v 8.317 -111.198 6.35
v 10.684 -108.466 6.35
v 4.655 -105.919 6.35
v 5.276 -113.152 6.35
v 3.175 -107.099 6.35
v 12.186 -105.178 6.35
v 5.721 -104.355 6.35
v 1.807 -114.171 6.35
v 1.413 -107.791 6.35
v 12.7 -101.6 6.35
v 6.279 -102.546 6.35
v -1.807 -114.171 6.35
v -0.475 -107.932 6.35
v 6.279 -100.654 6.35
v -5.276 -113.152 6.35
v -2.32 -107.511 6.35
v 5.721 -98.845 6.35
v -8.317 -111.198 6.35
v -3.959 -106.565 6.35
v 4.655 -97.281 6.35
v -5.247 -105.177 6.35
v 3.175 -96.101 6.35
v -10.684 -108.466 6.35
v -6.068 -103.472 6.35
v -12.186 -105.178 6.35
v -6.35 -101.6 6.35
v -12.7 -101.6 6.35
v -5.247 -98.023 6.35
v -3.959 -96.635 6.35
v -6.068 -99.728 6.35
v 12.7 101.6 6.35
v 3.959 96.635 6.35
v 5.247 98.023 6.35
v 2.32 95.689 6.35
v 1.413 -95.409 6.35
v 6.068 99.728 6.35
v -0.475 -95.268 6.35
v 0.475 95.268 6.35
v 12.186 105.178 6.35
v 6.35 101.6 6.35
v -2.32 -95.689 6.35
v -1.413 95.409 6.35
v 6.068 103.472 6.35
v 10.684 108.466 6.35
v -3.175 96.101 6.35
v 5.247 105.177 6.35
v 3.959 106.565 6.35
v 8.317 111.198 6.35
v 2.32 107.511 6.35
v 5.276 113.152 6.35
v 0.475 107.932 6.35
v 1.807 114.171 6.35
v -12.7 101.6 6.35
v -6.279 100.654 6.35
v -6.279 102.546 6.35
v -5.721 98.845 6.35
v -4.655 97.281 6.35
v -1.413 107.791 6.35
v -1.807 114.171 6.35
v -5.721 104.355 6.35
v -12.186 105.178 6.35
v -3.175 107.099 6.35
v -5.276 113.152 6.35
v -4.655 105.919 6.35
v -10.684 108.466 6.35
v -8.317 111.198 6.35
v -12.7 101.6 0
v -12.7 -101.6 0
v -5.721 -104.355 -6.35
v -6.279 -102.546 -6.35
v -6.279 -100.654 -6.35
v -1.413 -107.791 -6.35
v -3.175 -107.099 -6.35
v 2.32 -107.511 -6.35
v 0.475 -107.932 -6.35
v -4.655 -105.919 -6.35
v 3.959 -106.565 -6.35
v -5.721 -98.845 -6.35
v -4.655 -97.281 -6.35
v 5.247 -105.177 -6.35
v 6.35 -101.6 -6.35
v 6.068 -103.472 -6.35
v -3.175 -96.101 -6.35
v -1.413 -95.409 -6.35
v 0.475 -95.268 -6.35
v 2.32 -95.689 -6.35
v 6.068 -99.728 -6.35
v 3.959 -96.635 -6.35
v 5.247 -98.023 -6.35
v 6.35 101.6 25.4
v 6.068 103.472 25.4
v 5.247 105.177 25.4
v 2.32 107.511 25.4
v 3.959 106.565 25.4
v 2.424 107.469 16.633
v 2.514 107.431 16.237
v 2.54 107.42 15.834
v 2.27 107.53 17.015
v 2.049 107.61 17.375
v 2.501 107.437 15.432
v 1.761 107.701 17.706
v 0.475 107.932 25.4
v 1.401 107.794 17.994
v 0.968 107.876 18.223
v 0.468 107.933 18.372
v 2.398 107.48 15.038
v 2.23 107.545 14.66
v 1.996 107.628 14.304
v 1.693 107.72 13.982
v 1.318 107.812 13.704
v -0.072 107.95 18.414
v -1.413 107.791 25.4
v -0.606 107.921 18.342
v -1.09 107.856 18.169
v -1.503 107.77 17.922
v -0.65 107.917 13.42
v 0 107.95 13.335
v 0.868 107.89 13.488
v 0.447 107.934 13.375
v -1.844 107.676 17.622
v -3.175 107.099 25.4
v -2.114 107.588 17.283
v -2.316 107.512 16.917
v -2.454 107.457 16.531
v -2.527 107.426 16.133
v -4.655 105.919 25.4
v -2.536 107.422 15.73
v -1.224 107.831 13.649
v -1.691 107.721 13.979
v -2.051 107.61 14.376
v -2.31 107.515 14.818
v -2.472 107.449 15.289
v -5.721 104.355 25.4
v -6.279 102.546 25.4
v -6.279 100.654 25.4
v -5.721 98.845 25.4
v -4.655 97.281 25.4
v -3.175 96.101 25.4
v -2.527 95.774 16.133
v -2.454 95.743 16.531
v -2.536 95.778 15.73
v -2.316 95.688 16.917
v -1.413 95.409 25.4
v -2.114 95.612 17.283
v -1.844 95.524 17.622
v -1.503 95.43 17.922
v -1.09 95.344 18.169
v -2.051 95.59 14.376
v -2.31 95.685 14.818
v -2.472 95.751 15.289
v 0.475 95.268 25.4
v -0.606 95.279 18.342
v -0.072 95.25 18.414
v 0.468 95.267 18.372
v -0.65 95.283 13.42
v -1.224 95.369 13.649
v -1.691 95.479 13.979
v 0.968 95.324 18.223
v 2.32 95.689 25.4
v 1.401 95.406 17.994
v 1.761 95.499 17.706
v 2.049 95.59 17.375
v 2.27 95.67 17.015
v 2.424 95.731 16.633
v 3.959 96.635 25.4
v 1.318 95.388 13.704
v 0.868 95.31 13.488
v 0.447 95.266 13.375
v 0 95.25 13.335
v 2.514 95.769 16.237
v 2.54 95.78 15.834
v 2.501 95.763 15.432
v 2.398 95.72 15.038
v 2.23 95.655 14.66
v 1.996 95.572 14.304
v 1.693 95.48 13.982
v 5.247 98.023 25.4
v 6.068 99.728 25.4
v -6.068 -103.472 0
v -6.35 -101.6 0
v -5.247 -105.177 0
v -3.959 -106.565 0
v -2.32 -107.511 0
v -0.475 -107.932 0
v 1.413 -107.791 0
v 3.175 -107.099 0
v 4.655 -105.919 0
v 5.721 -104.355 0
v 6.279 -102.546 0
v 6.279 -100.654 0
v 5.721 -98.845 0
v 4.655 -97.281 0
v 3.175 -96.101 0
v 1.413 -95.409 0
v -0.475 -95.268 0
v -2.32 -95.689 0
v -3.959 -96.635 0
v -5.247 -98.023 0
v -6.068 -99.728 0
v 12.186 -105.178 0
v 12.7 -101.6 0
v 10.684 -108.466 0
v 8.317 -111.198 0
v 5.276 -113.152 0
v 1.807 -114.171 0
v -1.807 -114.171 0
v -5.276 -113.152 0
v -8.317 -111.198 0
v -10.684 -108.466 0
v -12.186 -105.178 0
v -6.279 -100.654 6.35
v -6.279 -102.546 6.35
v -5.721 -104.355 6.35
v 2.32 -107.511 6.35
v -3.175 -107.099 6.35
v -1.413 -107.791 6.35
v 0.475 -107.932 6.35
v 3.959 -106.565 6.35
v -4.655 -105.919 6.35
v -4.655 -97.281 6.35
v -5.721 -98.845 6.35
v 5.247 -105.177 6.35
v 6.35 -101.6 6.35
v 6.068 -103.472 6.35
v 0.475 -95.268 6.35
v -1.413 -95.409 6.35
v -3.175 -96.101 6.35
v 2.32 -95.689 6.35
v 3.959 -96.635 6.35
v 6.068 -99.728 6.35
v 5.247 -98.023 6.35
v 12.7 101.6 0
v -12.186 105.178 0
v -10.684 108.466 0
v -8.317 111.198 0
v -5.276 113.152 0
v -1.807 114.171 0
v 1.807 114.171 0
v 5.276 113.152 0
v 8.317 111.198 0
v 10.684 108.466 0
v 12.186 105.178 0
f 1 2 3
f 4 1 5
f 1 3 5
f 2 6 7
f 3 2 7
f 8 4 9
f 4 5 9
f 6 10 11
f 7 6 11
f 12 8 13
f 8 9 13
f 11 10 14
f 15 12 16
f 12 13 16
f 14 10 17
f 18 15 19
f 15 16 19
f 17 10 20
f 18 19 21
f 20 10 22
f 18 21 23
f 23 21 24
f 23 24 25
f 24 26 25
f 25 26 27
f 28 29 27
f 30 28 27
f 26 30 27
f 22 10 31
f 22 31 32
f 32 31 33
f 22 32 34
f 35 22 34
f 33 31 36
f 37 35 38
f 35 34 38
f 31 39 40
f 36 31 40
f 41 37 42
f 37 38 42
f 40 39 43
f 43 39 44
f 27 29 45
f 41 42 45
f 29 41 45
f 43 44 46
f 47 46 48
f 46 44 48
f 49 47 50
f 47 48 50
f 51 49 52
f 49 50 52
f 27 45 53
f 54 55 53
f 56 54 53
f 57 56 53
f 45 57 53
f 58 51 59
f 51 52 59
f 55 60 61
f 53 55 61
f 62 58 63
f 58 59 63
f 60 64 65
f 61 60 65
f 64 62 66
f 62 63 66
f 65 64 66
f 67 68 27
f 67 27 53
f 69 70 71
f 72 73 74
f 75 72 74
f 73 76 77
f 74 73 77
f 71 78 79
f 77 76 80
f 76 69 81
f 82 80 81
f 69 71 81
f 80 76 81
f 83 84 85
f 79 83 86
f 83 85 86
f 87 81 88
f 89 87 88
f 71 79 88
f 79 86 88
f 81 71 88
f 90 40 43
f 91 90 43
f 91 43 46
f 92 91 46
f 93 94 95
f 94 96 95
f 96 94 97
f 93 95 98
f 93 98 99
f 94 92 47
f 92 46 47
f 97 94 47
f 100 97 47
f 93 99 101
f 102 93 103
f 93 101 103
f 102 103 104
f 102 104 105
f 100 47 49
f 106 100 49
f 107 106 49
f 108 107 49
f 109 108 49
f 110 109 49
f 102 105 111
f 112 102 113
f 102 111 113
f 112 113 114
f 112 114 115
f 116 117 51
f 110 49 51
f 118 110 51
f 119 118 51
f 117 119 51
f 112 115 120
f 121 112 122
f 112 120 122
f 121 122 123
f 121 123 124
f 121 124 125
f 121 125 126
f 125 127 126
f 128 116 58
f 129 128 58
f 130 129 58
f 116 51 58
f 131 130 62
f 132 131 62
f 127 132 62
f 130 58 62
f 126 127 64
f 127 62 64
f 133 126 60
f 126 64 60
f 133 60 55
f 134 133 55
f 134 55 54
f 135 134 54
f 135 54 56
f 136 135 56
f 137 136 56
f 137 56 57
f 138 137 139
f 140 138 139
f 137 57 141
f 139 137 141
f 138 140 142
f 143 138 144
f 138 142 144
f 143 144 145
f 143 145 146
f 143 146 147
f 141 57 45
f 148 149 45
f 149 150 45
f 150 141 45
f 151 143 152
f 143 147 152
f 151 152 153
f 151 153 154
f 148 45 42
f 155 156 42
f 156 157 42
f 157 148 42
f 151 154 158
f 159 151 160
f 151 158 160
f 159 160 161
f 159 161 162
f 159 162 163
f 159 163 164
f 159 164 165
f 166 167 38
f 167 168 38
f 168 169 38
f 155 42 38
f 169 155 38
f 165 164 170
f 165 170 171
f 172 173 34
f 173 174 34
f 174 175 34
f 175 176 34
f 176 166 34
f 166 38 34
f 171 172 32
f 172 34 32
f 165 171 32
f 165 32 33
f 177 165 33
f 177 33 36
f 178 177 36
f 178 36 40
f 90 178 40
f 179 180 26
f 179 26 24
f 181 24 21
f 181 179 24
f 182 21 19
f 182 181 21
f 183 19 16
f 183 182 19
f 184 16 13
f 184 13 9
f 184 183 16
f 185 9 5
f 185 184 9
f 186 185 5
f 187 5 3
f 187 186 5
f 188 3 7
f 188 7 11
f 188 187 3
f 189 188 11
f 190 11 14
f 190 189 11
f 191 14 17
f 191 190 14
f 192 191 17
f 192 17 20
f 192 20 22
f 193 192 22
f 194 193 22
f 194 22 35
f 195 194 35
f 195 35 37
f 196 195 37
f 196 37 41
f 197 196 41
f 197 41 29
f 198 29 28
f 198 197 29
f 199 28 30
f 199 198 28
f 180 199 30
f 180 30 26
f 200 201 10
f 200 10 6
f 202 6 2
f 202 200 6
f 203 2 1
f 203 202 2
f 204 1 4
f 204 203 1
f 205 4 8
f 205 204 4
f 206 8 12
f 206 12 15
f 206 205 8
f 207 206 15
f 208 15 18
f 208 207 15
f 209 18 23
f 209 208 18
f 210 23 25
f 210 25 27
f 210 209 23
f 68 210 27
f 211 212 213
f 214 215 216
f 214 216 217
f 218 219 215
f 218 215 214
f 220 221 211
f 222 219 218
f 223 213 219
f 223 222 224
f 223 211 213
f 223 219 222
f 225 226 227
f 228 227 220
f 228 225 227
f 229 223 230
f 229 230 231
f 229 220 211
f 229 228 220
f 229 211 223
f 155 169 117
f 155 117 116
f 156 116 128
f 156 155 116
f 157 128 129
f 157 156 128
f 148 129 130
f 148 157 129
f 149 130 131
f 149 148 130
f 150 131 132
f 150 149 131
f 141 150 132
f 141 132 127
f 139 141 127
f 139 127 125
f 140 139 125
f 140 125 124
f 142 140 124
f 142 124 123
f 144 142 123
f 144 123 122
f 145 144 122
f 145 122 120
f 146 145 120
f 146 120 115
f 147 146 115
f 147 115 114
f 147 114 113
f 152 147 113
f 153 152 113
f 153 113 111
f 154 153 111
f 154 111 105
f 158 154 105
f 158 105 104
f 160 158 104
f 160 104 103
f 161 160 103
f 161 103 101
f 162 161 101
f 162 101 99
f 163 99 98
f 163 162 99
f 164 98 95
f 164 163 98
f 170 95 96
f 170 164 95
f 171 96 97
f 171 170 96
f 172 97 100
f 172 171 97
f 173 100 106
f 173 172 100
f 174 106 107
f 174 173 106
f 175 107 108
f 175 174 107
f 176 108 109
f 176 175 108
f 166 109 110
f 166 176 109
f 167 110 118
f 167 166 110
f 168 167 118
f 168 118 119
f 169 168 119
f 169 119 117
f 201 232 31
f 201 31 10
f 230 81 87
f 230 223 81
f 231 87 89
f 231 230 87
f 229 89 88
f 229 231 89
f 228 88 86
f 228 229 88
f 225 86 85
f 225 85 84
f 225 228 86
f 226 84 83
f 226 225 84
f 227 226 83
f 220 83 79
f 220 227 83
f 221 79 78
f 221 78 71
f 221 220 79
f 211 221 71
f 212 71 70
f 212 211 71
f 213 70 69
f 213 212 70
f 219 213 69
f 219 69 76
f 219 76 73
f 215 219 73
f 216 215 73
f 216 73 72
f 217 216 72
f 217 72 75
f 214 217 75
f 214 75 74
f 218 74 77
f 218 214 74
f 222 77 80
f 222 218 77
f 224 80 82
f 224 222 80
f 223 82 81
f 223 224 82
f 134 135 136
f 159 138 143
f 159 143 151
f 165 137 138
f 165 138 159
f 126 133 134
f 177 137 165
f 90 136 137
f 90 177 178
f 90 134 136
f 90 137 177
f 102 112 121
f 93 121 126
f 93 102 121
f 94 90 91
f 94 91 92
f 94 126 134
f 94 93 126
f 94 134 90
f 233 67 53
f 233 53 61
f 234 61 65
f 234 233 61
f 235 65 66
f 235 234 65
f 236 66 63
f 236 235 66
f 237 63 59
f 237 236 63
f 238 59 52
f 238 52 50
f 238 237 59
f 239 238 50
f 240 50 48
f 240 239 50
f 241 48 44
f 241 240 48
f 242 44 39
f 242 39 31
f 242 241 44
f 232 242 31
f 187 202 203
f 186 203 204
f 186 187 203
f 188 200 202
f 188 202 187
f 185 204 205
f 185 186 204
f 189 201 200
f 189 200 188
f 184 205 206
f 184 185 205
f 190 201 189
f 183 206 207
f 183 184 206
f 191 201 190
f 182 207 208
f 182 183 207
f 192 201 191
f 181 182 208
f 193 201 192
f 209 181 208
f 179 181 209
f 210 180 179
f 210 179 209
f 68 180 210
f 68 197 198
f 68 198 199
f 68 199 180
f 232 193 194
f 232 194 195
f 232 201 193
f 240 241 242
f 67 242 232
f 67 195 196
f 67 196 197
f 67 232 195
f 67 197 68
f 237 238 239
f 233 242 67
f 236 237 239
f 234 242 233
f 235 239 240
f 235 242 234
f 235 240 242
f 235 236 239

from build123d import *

# Parameters (mm, degrees)
SKETCH1_R           = 6.35
BOSS_EXTRUDE1_DEPTH = 6.35
SKETCH2_R           = 6.35
BOSS_EXTRUDE3_DEPTH = 25.4
SKETCH4_R           = 6.35
BOSS_EXTRUDE4_DEPTH = 6.35
SKETCH5_R           = 2.54
CUT_EXTRUDE2_DEPTH  = 118.774954893


with BuildPart() as part:
    # Sketch1 → Boss-Extrude1 (new body)
    with BuildSketch(Plane.XY):
        with BuildLine():
            Line((-12.7, -101.6), (-12.7, 101.6))
            ThreePointArc((-12.7, 101.6), (0, 114.3), (12.7, 101.6))
            Line((12.7, 101.6), (12.7, -101.6))
            ThreePointArc((12.7, -101.6), (0, -114.3), (-12.7, -101.6))
        make_face()
        with Locations((0, 101.6)):
            Circle(SKETCH1_R, mode=Mode.SUBTRACT)
        with Locations(Location((0, -101.6, 0), (0, 0, 180))):
            Circle(SKETCH1_R, mode=Mode.SUBTRACT)
    extrude(amount=BOSS_EXTRUDE1_DEPTH)

    # Sketch2 → Boss-Extrude3 (add)
    with BuildSketch(Plane.XY):
        with Locations((0, 101.6)):
            Circle(SKETCH2_R)
    extrude(amount=BOSS_EXTRUDE3_DEPTH)

    # Sketch5 → Cut-Extrude2 (cut, through all)
    with BuildSketch(Plane(origin=(0, 0, 0), x_dir=(1, 0, 0), z_dir=(0, 1, 0))):
        with Locations(Location((0, -15.875, 0), (0, 0, 90))):
            Circle(SKETCH5_R)
    extrude(amount=CUT_EXTRUDE2_DEPTH, mode=Mode.SUBTRACT)


with BuildPart() as body_2:
    # Sketch4 → Boss-Extrude4 (new, symmetric)
    with BuildSketch(Plane.XY):
        with Locations((0, -101.6)):
            Circle(SKETCH4_R)
    extrude(amount=BOSS_EXTRUDE4_DEPTH, both=True)


solid = Compound([part.part, body_2.part])
